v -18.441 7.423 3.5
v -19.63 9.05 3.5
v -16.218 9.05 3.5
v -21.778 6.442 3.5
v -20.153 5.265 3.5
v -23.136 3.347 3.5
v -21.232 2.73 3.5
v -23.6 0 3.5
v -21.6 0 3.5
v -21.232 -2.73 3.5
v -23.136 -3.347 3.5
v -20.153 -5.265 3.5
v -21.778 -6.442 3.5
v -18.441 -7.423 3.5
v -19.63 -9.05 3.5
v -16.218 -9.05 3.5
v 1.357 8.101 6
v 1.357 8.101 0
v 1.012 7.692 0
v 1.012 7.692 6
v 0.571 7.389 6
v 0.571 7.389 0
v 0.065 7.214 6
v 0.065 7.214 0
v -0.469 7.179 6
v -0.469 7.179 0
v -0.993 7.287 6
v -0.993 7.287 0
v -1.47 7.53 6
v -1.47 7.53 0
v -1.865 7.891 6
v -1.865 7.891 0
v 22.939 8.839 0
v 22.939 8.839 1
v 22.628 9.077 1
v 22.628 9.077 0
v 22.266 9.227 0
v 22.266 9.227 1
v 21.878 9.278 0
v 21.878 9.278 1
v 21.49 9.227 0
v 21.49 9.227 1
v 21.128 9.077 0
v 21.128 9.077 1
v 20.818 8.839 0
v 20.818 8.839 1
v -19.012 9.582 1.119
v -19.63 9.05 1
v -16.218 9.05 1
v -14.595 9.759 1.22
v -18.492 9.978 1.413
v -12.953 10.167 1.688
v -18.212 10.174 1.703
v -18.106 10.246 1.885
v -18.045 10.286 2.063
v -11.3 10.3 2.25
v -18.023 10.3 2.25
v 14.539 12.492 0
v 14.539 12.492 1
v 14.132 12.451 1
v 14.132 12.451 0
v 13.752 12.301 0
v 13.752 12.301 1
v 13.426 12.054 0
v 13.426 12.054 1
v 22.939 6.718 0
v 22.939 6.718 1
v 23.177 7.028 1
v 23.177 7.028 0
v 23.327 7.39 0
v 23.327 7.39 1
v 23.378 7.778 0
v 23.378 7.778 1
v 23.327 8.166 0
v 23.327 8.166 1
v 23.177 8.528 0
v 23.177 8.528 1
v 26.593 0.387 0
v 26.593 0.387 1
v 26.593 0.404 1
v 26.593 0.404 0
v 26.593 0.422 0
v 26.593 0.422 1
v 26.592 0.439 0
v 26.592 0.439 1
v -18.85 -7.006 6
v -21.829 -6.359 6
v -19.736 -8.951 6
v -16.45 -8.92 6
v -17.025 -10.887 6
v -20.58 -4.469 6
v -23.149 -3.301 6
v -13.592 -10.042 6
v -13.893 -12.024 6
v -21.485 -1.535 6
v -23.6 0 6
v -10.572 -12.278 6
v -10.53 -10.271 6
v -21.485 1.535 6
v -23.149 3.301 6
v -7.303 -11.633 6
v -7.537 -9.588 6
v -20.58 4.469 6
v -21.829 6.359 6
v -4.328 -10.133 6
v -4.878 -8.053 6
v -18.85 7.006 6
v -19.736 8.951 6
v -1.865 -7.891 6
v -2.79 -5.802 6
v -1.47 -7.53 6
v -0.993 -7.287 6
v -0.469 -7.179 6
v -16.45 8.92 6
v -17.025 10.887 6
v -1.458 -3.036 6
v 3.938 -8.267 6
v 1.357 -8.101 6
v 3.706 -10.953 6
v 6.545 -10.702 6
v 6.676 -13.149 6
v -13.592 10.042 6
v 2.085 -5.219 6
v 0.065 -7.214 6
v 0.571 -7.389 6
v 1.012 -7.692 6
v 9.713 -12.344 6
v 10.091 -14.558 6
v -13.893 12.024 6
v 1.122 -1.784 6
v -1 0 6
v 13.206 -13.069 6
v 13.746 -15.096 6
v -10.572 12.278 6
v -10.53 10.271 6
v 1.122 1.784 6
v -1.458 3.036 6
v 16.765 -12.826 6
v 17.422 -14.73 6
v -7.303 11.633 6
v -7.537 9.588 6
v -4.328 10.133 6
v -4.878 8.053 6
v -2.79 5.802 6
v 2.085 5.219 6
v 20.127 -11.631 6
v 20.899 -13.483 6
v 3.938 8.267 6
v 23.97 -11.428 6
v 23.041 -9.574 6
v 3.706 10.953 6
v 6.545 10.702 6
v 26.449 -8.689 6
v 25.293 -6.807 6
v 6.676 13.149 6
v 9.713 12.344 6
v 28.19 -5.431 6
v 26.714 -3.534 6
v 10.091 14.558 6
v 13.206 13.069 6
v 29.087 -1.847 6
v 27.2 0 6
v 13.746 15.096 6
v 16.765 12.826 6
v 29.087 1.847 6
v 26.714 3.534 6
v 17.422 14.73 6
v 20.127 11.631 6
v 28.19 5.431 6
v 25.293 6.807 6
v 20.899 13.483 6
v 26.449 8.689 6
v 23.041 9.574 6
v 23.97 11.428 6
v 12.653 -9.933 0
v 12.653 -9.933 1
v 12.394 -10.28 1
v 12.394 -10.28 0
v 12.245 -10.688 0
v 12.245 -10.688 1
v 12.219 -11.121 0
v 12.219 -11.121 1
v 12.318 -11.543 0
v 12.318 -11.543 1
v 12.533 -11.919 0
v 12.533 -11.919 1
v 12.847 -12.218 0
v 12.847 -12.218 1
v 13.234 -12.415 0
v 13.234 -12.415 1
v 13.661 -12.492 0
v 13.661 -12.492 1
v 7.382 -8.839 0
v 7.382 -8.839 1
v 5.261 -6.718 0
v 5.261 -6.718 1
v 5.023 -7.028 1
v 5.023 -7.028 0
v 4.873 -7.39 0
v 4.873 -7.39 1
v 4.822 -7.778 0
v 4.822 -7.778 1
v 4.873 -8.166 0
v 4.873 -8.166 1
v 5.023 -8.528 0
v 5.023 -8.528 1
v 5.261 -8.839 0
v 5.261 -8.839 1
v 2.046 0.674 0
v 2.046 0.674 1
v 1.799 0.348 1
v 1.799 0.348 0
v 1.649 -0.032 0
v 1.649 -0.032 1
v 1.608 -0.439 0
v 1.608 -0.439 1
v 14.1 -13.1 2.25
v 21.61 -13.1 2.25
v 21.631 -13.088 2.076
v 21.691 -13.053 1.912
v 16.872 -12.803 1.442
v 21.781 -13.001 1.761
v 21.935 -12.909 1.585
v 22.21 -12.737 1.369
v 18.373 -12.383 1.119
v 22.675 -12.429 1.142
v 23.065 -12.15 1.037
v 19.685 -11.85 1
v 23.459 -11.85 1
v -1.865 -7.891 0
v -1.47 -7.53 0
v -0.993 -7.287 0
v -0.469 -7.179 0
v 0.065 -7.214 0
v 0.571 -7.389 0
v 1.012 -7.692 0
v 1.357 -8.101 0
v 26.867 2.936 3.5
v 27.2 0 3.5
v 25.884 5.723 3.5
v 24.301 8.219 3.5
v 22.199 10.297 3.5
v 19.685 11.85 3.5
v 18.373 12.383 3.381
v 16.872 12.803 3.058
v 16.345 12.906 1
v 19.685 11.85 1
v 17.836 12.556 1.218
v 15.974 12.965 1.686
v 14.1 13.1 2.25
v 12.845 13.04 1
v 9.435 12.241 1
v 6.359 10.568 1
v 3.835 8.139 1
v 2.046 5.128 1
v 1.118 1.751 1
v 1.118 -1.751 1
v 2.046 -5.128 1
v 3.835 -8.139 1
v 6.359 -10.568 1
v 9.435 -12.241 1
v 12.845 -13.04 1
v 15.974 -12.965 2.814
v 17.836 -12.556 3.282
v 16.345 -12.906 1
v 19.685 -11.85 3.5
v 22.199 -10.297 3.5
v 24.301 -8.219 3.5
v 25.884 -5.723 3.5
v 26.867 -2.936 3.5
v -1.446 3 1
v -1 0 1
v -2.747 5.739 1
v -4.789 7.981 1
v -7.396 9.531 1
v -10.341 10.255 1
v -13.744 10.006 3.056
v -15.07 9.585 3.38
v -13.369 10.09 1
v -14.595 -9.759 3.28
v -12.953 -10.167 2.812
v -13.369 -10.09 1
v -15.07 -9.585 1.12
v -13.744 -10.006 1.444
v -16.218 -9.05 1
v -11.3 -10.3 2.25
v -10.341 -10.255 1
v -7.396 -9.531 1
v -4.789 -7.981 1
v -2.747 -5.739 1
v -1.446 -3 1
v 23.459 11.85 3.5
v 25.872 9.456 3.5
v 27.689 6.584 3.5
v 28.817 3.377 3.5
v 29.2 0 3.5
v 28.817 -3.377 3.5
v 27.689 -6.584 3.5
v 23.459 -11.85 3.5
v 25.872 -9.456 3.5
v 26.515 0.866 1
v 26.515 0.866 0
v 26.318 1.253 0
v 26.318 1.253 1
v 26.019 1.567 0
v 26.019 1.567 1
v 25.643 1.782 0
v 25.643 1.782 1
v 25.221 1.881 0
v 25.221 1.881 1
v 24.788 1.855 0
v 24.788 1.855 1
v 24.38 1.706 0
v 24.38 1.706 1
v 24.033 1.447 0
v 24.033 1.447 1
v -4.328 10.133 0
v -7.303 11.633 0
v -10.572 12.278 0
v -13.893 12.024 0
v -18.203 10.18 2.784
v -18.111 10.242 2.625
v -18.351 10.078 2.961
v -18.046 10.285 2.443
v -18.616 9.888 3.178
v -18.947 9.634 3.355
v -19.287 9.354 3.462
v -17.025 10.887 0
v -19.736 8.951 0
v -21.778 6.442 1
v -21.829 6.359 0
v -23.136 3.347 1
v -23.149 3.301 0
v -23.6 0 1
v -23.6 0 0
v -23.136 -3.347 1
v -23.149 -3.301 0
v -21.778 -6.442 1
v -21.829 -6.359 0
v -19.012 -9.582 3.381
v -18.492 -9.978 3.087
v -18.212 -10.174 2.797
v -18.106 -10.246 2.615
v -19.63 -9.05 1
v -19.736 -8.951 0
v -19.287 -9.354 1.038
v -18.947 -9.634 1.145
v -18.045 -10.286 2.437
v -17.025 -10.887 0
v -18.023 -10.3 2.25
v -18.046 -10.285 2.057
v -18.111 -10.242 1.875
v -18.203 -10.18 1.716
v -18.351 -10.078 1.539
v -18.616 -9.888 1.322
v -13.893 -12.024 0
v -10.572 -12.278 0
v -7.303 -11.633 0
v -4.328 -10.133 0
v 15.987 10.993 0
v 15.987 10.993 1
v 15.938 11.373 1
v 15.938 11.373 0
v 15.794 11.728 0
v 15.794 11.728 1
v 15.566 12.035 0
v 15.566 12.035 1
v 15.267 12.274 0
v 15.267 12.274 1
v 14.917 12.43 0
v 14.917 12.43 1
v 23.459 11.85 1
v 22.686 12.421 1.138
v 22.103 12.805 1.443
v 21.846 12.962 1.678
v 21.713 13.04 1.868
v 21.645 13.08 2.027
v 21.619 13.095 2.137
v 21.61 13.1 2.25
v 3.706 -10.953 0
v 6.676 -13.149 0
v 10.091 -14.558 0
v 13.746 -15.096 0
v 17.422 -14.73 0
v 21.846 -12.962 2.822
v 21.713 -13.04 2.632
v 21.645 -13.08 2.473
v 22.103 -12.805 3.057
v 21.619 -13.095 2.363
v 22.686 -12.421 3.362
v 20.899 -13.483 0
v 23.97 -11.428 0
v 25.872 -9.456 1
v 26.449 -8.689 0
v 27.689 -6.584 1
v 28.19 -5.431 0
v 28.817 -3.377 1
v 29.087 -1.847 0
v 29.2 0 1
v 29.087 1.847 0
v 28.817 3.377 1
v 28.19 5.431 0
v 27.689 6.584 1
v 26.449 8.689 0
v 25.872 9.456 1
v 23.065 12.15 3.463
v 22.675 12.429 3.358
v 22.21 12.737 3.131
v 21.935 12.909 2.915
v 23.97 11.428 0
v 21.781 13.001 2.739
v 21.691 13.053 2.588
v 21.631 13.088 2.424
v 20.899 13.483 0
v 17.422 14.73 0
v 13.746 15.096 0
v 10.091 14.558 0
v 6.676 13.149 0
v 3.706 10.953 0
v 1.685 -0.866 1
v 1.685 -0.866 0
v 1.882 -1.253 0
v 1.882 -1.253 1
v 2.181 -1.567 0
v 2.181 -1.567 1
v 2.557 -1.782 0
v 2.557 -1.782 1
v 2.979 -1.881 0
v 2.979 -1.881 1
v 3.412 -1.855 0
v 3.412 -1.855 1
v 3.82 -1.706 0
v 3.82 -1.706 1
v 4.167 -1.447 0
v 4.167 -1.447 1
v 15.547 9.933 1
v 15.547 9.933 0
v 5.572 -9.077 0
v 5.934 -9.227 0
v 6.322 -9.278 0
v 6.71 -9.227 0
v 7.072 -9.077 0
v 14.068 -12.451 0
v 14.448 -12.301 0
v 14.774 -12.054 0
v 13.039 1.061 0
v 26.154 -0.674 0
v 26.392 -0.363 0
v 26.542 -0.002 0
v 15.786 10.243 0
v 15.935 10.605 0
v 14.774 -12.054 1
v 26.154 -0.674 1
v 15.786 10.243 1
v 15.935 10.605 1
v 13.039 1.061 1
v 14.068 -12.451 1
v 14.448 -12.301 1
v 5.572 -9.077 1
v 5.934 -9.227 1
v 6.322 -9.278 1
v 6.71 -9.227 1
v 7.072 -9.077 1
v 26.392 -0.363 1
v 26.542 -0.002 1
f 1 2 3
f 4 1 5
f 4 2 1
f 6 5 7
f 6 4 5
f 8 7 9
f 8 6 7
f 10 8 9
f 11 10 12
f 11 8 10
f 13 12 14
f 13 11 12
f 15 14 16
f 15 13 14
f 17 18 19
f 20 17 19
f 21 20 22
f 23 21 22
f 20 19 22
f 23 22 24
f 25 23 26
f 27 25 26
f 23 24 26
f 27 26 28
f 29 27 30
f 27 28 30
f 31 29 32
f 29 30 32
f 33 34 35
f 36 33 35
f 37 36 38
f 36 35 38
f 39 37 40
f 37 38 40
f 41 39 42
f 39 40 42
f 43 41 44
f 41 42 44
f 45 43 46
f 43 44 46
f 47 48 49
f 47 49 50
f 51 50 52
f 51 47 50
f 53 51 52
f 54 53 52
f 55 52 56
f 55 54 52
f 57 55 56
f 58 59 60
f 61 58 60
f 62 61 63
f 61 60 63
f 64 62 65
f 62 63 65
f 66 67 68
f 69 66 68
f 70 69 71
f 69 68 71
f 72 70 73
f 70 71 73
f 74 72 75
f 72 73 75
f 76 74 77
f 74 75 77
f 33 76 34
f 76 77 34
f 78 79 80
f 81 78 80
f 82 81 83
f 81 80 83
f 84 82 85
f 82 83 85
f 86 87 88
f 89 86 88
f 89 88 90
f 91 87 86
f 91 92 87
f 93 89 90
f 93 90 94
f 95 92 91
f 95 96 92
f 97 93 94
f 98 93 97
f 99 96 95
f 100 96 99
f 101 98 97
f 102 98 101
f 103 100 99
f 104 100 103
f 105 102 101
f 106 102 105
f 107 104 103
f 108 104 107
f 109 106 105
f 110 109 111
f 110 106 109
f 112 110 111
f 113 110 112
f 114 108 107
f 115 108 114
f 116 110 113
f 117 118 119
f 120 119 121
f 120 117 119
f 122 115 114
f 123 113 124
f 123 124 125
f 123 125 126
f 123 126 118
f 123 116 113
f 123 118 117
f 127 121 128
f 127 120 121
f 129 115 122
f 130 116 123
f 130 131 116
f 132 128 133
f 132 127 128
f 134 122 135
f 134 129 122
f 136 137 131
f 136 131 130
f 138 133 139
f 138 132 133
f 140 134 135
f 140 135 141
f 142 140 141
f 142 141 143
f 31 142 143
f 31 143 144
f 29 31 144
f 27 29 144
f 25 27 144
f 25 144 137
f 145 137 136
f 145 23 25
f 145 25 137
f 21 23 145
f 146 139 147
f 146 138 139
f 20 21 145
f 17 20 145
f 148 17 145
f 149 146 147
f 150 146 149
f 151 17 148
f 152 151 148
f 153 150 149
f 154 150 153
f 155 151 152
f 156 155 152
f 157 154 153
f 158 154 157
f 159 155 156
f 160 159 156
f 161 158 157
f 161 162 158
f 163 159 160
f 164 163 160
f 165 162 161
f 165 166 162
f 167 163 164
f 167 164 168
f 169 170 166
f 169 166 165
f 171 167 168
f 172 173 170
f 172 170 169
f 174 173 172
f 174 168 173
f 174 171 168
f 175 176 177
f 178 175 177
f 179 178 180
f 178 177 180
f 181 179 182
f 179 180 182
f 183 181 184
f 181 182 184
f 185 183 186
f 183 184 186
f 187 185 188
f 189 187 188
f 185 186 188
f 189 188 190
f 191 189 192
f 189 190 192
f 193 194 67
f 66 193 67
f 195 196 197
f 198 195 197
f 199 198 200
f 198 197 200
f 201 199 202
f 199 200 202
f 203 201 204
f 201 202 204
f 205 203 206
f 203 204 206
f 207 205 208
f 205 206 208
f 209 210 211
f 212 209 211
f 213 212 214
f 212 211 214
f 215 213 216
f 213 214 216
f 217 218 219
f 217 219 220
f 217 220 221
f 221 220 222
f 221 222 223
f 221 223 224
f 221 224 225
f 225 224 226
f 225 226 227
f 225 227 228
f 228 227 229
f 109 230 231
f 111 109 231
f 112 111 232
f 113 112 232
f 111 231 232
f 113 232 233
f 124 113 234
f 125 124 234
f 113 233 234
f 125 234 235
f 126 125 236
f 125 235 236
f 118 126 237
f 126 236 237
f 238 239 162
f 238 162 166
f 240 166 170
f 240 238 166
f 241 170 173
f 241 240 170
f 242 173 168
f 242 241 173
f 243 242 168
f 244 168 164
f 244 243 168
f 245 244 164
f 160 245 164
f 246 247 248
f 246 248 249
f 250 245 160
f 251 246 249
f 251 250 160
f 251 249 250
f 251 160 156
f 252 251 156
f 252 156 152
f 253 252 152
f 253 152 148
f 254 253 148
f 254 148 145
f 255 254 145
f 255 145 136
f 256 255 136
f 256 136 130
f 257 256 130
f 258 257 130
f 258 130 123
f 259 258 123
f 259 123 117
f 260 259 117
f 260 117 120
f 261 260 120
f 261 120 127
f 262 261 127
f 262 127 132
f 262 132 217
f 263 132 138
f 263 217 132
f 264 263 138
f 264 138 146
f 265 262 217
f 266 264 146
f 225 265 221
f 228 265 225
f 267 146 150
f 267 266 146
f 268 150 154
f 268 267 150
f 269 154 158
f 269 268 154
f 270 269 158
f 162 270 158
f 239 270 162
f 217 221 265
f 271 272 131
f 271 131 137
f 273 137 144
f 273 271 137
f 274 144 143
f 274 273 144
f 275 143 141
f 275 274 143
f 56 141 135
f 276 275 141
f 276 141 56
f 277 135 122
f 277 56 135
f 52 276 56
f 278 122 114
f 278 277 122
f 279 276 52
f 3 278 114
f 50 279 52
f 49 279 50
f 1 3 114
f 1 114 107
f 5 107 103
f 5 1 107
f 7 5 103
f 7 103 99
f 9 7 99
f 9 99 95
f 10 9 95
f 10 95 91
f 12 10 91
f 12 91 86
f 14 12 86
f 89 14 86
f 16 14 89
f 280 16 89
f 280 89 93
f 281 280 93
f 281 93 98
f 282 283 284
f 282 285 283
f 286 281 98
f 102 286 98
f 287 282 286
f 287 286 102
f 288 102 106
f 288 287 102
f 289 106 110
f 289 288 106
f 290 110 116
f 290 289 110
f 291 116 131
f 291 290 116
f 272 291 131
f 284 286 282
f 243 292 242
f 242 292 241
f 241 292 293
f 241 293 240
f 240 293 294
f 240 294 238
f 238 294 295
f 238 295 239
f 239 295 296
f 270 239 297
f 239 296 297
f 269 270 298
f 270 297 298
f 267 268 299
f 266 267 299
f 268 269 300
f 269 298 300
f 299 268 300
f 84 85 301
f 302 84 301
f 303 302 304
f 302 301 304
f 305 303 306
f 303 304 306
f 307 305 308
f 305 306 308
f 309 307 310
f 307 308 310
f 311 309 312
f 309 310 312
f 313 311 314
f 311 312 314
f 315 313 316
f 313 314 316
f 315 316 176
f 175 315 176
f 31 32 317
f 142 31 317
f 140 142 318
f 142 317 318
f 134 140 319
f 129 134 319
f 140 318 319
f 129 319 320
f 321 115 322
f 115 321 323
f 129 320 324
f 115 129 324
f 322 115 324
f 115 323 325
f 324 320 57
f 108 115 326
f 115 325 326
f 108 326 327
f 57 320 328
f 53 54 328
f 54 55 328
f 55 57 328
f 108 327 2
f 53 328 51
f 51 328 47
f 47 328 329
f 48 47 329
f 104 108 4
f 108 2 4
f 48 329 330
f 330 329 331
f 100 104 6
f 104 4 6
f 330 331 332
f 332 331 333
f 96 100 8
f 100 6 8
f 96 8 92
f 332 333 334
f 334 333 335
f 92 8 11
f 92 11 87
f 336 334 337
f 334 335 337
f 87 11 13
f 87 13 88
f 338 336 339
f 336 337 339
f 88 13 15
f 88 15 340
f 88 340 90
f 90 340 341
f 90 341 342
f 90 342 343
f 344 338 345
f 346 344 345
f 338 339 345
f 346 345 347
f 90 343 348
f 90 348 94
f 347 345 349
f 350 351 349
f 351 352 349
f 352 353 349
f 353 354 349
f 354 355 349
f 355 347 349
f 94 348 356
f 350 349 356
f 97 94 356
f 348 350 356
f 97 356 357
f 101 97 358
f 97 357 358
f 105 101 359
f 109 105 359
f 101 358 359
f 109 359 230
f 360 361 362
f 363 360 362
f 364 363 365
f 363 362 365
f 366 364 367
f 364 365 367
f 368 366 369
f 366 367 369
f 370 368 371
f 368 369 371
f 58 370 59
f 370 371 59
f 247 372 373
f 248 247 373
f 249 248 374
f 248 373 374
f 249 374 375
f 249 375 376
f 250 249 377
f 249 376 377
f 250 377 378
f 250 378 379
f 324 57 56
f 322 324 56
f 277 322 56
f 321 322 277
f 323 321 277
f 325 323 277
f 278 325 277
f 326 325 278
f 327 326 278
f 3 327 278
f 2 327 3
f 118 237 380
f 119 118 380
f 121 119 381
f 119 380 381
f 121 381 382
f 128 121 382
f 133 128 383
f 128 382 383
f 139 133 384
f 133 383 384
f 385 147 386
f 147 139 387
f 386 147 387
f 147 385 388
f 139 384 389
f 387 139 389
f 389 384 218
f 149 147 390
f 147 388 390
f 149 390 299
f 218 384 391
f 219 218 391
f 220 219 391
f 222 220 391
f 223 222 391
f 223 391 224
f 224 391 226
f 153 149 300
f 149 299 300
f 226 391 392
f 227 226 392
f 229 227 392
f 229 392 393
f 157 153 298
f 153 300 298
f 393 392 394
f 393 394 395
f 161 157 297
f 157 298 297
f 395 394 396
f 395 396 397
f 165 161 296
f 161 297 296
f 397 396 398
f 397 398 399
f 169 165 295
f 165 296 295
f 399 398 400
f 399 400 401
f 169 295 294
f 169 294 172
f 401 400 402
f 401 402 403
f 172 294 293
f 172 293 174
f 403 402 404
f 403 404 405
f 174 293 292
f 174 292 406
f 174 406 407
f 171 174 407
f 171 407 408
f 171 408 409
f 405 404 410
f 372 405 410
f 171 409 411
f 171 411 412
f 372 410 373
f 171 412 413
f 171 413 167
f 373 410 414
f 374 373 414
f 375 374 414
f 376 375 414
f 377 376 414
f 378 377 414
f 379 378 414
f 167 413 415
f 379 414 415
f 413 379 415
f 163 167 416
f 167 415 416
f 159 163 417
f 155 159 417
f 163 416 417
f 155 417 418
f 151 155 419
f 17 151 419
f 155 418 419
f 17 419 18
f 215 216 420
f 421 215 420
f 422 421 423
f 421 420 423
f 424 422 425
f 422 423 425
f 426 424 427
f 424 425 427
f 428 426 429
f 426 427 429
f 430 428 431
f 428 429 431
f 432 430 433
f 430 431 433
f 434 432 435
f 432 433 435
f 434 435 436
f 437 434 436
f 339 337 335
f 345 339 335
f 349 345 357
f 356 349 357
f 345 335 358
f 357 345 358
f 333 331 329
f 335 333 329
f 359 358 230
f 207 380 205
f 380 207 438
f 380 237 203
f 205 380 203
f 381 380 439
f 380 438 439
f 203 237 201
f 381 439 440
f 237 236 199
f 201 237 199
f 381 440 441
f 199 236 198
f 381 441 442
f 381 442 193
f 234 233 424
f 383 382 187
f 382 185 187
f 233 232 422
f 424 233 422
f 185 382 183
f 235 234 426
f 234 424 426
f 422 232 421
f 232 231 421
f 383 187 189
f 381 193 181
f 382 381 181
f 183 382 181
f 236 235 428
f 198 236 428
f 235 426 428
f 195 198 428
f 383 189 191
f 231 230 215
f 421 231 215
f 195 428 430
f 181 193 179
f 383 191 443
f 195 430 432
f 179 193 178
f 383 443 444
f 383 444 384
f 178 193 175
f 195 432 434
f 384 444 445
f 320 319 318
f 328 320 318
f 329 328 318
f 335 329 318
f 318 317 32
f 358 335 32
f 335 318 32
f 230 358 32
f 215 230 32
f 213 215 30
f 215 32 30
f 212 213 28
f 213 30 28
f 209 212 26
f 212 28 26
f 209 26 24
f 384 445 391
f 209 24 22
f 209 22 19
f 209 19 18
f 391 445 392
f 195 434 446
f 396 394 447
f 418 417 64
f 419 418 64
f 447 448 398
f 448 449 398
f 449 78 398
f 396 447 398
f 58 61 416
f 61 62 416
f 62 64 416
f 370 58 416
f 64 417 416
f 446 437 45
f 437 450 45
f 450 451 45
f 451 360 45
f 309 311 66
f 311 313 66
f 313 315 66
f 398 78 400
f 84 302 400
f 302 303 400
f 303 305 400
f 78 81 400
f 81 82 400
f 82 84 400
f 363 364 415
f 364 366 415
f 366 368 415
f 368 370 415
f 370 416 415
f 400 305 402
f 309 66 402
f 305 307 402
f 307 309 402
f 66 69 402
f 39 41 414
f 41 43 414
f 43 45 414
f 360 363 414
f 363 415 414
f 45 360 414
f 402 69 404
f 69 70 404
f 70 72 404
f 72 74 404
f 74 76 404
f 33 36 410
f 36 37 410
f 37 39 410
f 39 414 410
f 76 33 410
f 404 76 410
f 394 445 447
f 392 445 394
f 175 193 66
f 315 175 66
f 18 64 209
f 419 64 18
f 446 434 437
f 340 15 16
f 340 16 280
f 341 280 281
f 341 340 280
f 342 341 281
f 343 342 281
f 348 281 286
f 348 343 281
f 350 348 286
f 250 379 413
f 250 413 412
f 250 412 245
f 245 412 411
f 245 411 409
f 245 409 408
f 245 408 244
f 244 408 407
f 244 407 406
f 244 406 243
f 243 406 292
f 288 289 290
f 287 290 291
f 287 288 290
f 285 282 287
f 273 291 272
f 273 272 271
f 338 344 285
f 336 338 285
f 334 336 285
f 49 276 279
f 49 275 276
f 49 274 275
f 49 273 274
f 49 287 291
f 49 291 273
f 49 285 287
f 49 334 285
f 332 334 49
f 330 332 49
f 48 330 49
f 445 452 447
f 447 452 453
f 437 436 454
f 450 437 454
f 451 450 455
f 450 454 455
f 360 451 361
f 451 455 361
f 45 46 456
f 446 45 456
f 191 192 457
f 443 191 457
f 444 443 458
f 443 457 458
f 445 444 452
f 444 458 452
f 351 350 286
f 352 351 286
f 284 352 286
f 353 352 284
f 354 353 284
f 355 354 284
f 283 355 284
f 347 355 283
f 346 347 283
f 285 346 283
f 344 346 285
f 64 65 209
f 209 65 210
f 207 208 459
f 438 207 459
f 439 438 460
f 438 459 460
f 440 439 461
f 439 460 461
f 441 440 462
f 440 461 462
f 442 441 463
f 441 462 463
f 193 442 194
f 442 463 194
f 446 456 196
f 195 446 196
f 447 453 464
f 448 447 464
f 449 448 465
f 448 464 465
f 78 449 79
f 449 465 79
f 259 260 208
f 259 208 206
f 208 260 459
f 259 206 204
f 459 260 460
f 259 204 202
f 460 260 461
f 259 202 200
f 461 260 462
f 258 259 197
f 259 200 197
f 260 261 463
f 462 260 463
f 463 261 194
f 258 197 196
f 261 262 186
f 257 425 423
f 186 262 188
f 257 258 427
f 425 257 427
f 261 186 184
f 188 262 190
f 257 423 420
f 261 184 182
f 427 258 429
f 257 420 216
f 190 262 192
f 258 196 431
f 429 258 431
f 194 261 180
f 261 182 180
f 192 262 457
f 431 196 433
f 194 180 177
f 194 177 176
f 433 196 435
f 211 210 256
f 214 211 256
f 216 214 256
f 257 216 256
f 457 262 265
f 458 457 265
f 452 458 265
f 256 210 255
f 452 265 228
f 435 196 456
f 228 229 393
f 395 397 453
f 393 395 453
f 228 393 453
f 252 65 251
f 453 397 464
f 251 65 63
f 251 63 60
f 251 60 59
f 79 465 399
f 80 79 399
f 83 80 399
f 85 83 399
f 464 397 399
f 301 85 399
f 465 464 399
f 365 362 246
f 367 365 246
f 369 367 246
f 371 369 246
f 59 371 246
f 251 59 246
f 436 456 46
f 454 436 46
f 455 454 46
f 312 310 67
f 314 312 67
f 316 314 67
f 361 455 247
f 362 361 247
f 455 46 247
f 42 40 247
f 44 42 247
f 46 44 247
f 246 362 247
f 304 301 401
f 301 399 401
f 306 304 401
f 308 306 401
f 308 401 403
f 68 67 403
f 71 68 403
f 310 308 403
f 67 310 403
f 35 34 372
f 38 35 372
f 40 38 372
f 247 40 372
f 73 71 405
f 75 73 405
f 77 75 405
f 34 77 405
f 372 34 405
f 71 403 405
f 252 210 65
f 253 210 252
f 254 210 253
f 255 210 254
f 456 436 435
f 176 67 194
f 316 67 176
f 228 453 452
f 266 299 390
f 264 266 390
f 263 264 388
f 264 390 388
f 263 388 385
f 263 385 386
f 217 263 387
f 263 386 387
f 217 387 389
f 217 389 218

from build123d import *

# Parameters (mm, degrees)
F0_R      = 10.3
F0_R_2    = 13.1
F1_DEPTH  = 1
F2_DEPTH  = 6
F5_DEPTH  = 28.7
F8_DEPTH  = 25.9
F10_DEPTH = 25


with BuildPart() as f1:
    # F0 (on Top) → F1 (new body)
    with BuildSketch(Plane.XY):
        with BuildLine():
            ThreePointArc((-1.864875, -7.891034), (-0.200569, -7.178368), (1.357094, -8.101132))
            ThreePointArc((1.357094, -8.101132), (29.2, 0), (1.357094, 8.101132))
            ThreePointArc((1.357094, 8.101132), (-0.200569, 7.178368), (-1.864875, 7.891034))
            ThreePointArc((-1.864875, 7.891034), (-23.6, 0), (-1.864875, -7.891034))
        make_face()
        with Locations((-11.3, 0)):
            Circle(F0_R, mode=Mode.SUBTRACT)
        with Locations((14.1, 0)):
            Circle(F0_R_2, mode=Mode.SUBTRACT)
        with Locations((-11.3, 0)):
            Circle(F0_R)
        with Locations((14.1, 0)):
            Circle(F0_R_2)
    extrude(amount=F1_DEPTH)

    # F0 (on Top) → F2 (join)
    with BuildSketch(Plane.XY):
        with BuildLine():
            ThreePointArc((-1.864875, -7.891034), (-0.200569, -7.178368), (1.357094, -8.101132))
            ThreePointArc((1.357094, -8.101132), (29.2, 0), (1.357094, 8.101132))
            ThreePointArc((1.357094, 8.101132), (-0.200569, 7.178368), (-1.864875, 7.891034))
            ThreePointArc((-1.864875, 7.891034), (-23.6, 0), (-1.864875, -7.891034))
        make_face()
        with Locations((-11.3, 0)):
            Circle(F0_R, mode=Mode.SUBTRACT)
        with Locations((14.1, 0)):
            Circle(F0_R_2, mode=Mode.SUBTRACT)
    extrude(amount=F2_DEPTH)

    # F4 (on offset) → F5 (cut)
    with BuildSketch(Plane.YZ.offset(-40)):
        with BuildLine():
            ThreePointArc((10.3, 2.25), (9.933883, 3.133883), (9.05, 3.5))
            Line((9.05, 3.5), (-9.05, 3.5))
            ThreePointArc((-9.05, 3.5), (-9.933883, 3.133883), (-10.3, 2.25))
            ThreePointArc((-10.3, 2.25), (-9.933883, 1.366117), (-9.05, 1))
            Line((-9.05, 1), (9.05, 1))
            ThreePointArc((9.05, 1), (9.933883, 1.366117), (10.3, 2.25))
        make_face()
    extrude(amount=F5_DEPTH, mode=Mode.SUBTRACT)

    # F7 (on offset) → F8 (cut)
    with BuildSketch(Plane.YZ.offset(40)):
        with BuildLine():
            Line((11.85, 3.5), (-11.85, 3.5))
            ThreePointArc((-11.85, 3.5), (-12.733883, 3.133883), (-13.1, 2.25))
            ThreePointArc((-13.1, 2.25), (-12.733883, 1.366117), (-11.85, 1))
            Line((-11.85, 1), (11.85, 1))
            ThreePointArc((11.85, 1), (12.733883, 1.366117), (13.1, 2.25))
            ThreePointArc((13.1, 2.25), (12.733883, 3.133883), (11.85, 3.5))
        make_face()
    extrude(amount=-F8_DEPTH, mode=Mode.SUBTRACT)

    # F9 (on face) → F10 (cut)
    with BuildSketch(Plane.XY.offset(1)):
        with BuildLine():
            ThreePointArc((15.547263, 9.932544), (13.425942, 9.932544), (13.425942, 12.053864))
            Line((13.425942, 12.053864), (2.046136, 0.674058))
            ThreePointArc((2.046136, 0.674058), (3.680821, 0.999217), (4.606796, -0.386602))
            ThreePointArc((4.606796, -0.386602), (4.492615, -0.960628), (4.167456, -1.447263))
            Line((4.167456, -1.447263), (15.547263, 9.932544))
        make_face()
        with BuildLine():
            ThreePointArc((15.986602, 10.993204), (15.565741, 12.035059), (14.539321, 12.492277))
            ThreePointArc((14.539321, 12.492277), (13.937023, 12.388898), (13.425942, 12.053864))
            ThreePointArc((13.425942, 12.053864), (13.425942, 9.932544), (15.547263, 9.932544))
            ThreePointArc((15.547263, 9.932544), (15.872422, 10.419179), (15.986602, 10.993204))
        make_face()
        with BuildLine():
            ThreePointArc((2.046136, 0.674058), (1.711102, 0.162977), (1.607723, -0.439321))
            ThreePointArc((1.607723, -0.439321), (2.557216, -1.782297), (4.167456, -1.447263))
            ThreePointArc((4.167456, -1.447263), (4.492615, -0.960628), (4.606796, -0.386602))
            ThreePointArc((4.606796, -0.386602), (3.680821, 0.999217), (2.046136, 0.674058))
        make_face()
        with BuildLine():
            ThreePointArc((22.938835, 6.717514), (23.378175, 7.778175), (22.938835, 8.838835))
            ThreePointArc((22.938835, 8.838835), (21.878175, 9.278175), (20.817514, 8.838835))
            Line((20.817514, 8.838835), (13.03934, 1.06066))
            Line((13.03934, 1.06066), (5.261165, -6.717514))
            ThreePointArc((5.261165, -6.717514), (4.821825, -7.778175), (5.261165, -8.838835))
            ThreePointArc((5.261165, -8.838835), (6.321825, -9.278175), (7.382486, -8.838835))
            Line((7.382486, -8.838835), (22.938835, 6.717514))
        make_face()
        with BuildLine():
            ThreePointArc((26.153864, -0.674058), (24.032544, -0.674058), (24.032544, 1.447263))
            Line((24.032544, 1.447263), (12.652737, -9.932544))
            ThreePointArc((12.652737, -9.932544), (14.287423, -9.607385), (15.213398, -10.993204))
            ThreePointArc((15.213398, -10.993204), (15.099217, -11.567229), (14.774058, -12.053864))
            Line((14.774058, -12.053864), (26.153864, -0.674058))
        make_face()
        with BuildLine():
            ThreePointArc((12.652737, -9.932544), (12.317703, -11.542784), (13.660679, -12.492277))
            ThreePointArc((13.660679, -12.492277), (14.262977, -12.388898), (14.774058, -12.053864))
            ThreePointArc((14.774058, -12.053864), (15.099217, -11.567229), (15.213398, -10.993204))
            ThreePointArc((15.213398, -10.993204), (14.287423, -9.607385), (12.652737, -9.932544))
        make_face()
        with BuildLine():
            ThreePointArc((26.593204, 0.386602), (26.592973, 0.412966), (26.592277, 0.439321))
            ThreePointArc((26.592277, 0.439321), (25.642784, 1.782297), (24.032544, 1.447263))
            ThreePointArc((24.032544, 1.447263), (24.032544, -0.674058), (26.153864, -0.674058))
            ThreePointArc((26.153864, -0.674058), (26.479023, -0.187423), (26.593204, 0.386602))
        make_face()
    extrude(amount=-F10_DEPTH, mode=Mode.SUBTRACT)


solid = f1.part
